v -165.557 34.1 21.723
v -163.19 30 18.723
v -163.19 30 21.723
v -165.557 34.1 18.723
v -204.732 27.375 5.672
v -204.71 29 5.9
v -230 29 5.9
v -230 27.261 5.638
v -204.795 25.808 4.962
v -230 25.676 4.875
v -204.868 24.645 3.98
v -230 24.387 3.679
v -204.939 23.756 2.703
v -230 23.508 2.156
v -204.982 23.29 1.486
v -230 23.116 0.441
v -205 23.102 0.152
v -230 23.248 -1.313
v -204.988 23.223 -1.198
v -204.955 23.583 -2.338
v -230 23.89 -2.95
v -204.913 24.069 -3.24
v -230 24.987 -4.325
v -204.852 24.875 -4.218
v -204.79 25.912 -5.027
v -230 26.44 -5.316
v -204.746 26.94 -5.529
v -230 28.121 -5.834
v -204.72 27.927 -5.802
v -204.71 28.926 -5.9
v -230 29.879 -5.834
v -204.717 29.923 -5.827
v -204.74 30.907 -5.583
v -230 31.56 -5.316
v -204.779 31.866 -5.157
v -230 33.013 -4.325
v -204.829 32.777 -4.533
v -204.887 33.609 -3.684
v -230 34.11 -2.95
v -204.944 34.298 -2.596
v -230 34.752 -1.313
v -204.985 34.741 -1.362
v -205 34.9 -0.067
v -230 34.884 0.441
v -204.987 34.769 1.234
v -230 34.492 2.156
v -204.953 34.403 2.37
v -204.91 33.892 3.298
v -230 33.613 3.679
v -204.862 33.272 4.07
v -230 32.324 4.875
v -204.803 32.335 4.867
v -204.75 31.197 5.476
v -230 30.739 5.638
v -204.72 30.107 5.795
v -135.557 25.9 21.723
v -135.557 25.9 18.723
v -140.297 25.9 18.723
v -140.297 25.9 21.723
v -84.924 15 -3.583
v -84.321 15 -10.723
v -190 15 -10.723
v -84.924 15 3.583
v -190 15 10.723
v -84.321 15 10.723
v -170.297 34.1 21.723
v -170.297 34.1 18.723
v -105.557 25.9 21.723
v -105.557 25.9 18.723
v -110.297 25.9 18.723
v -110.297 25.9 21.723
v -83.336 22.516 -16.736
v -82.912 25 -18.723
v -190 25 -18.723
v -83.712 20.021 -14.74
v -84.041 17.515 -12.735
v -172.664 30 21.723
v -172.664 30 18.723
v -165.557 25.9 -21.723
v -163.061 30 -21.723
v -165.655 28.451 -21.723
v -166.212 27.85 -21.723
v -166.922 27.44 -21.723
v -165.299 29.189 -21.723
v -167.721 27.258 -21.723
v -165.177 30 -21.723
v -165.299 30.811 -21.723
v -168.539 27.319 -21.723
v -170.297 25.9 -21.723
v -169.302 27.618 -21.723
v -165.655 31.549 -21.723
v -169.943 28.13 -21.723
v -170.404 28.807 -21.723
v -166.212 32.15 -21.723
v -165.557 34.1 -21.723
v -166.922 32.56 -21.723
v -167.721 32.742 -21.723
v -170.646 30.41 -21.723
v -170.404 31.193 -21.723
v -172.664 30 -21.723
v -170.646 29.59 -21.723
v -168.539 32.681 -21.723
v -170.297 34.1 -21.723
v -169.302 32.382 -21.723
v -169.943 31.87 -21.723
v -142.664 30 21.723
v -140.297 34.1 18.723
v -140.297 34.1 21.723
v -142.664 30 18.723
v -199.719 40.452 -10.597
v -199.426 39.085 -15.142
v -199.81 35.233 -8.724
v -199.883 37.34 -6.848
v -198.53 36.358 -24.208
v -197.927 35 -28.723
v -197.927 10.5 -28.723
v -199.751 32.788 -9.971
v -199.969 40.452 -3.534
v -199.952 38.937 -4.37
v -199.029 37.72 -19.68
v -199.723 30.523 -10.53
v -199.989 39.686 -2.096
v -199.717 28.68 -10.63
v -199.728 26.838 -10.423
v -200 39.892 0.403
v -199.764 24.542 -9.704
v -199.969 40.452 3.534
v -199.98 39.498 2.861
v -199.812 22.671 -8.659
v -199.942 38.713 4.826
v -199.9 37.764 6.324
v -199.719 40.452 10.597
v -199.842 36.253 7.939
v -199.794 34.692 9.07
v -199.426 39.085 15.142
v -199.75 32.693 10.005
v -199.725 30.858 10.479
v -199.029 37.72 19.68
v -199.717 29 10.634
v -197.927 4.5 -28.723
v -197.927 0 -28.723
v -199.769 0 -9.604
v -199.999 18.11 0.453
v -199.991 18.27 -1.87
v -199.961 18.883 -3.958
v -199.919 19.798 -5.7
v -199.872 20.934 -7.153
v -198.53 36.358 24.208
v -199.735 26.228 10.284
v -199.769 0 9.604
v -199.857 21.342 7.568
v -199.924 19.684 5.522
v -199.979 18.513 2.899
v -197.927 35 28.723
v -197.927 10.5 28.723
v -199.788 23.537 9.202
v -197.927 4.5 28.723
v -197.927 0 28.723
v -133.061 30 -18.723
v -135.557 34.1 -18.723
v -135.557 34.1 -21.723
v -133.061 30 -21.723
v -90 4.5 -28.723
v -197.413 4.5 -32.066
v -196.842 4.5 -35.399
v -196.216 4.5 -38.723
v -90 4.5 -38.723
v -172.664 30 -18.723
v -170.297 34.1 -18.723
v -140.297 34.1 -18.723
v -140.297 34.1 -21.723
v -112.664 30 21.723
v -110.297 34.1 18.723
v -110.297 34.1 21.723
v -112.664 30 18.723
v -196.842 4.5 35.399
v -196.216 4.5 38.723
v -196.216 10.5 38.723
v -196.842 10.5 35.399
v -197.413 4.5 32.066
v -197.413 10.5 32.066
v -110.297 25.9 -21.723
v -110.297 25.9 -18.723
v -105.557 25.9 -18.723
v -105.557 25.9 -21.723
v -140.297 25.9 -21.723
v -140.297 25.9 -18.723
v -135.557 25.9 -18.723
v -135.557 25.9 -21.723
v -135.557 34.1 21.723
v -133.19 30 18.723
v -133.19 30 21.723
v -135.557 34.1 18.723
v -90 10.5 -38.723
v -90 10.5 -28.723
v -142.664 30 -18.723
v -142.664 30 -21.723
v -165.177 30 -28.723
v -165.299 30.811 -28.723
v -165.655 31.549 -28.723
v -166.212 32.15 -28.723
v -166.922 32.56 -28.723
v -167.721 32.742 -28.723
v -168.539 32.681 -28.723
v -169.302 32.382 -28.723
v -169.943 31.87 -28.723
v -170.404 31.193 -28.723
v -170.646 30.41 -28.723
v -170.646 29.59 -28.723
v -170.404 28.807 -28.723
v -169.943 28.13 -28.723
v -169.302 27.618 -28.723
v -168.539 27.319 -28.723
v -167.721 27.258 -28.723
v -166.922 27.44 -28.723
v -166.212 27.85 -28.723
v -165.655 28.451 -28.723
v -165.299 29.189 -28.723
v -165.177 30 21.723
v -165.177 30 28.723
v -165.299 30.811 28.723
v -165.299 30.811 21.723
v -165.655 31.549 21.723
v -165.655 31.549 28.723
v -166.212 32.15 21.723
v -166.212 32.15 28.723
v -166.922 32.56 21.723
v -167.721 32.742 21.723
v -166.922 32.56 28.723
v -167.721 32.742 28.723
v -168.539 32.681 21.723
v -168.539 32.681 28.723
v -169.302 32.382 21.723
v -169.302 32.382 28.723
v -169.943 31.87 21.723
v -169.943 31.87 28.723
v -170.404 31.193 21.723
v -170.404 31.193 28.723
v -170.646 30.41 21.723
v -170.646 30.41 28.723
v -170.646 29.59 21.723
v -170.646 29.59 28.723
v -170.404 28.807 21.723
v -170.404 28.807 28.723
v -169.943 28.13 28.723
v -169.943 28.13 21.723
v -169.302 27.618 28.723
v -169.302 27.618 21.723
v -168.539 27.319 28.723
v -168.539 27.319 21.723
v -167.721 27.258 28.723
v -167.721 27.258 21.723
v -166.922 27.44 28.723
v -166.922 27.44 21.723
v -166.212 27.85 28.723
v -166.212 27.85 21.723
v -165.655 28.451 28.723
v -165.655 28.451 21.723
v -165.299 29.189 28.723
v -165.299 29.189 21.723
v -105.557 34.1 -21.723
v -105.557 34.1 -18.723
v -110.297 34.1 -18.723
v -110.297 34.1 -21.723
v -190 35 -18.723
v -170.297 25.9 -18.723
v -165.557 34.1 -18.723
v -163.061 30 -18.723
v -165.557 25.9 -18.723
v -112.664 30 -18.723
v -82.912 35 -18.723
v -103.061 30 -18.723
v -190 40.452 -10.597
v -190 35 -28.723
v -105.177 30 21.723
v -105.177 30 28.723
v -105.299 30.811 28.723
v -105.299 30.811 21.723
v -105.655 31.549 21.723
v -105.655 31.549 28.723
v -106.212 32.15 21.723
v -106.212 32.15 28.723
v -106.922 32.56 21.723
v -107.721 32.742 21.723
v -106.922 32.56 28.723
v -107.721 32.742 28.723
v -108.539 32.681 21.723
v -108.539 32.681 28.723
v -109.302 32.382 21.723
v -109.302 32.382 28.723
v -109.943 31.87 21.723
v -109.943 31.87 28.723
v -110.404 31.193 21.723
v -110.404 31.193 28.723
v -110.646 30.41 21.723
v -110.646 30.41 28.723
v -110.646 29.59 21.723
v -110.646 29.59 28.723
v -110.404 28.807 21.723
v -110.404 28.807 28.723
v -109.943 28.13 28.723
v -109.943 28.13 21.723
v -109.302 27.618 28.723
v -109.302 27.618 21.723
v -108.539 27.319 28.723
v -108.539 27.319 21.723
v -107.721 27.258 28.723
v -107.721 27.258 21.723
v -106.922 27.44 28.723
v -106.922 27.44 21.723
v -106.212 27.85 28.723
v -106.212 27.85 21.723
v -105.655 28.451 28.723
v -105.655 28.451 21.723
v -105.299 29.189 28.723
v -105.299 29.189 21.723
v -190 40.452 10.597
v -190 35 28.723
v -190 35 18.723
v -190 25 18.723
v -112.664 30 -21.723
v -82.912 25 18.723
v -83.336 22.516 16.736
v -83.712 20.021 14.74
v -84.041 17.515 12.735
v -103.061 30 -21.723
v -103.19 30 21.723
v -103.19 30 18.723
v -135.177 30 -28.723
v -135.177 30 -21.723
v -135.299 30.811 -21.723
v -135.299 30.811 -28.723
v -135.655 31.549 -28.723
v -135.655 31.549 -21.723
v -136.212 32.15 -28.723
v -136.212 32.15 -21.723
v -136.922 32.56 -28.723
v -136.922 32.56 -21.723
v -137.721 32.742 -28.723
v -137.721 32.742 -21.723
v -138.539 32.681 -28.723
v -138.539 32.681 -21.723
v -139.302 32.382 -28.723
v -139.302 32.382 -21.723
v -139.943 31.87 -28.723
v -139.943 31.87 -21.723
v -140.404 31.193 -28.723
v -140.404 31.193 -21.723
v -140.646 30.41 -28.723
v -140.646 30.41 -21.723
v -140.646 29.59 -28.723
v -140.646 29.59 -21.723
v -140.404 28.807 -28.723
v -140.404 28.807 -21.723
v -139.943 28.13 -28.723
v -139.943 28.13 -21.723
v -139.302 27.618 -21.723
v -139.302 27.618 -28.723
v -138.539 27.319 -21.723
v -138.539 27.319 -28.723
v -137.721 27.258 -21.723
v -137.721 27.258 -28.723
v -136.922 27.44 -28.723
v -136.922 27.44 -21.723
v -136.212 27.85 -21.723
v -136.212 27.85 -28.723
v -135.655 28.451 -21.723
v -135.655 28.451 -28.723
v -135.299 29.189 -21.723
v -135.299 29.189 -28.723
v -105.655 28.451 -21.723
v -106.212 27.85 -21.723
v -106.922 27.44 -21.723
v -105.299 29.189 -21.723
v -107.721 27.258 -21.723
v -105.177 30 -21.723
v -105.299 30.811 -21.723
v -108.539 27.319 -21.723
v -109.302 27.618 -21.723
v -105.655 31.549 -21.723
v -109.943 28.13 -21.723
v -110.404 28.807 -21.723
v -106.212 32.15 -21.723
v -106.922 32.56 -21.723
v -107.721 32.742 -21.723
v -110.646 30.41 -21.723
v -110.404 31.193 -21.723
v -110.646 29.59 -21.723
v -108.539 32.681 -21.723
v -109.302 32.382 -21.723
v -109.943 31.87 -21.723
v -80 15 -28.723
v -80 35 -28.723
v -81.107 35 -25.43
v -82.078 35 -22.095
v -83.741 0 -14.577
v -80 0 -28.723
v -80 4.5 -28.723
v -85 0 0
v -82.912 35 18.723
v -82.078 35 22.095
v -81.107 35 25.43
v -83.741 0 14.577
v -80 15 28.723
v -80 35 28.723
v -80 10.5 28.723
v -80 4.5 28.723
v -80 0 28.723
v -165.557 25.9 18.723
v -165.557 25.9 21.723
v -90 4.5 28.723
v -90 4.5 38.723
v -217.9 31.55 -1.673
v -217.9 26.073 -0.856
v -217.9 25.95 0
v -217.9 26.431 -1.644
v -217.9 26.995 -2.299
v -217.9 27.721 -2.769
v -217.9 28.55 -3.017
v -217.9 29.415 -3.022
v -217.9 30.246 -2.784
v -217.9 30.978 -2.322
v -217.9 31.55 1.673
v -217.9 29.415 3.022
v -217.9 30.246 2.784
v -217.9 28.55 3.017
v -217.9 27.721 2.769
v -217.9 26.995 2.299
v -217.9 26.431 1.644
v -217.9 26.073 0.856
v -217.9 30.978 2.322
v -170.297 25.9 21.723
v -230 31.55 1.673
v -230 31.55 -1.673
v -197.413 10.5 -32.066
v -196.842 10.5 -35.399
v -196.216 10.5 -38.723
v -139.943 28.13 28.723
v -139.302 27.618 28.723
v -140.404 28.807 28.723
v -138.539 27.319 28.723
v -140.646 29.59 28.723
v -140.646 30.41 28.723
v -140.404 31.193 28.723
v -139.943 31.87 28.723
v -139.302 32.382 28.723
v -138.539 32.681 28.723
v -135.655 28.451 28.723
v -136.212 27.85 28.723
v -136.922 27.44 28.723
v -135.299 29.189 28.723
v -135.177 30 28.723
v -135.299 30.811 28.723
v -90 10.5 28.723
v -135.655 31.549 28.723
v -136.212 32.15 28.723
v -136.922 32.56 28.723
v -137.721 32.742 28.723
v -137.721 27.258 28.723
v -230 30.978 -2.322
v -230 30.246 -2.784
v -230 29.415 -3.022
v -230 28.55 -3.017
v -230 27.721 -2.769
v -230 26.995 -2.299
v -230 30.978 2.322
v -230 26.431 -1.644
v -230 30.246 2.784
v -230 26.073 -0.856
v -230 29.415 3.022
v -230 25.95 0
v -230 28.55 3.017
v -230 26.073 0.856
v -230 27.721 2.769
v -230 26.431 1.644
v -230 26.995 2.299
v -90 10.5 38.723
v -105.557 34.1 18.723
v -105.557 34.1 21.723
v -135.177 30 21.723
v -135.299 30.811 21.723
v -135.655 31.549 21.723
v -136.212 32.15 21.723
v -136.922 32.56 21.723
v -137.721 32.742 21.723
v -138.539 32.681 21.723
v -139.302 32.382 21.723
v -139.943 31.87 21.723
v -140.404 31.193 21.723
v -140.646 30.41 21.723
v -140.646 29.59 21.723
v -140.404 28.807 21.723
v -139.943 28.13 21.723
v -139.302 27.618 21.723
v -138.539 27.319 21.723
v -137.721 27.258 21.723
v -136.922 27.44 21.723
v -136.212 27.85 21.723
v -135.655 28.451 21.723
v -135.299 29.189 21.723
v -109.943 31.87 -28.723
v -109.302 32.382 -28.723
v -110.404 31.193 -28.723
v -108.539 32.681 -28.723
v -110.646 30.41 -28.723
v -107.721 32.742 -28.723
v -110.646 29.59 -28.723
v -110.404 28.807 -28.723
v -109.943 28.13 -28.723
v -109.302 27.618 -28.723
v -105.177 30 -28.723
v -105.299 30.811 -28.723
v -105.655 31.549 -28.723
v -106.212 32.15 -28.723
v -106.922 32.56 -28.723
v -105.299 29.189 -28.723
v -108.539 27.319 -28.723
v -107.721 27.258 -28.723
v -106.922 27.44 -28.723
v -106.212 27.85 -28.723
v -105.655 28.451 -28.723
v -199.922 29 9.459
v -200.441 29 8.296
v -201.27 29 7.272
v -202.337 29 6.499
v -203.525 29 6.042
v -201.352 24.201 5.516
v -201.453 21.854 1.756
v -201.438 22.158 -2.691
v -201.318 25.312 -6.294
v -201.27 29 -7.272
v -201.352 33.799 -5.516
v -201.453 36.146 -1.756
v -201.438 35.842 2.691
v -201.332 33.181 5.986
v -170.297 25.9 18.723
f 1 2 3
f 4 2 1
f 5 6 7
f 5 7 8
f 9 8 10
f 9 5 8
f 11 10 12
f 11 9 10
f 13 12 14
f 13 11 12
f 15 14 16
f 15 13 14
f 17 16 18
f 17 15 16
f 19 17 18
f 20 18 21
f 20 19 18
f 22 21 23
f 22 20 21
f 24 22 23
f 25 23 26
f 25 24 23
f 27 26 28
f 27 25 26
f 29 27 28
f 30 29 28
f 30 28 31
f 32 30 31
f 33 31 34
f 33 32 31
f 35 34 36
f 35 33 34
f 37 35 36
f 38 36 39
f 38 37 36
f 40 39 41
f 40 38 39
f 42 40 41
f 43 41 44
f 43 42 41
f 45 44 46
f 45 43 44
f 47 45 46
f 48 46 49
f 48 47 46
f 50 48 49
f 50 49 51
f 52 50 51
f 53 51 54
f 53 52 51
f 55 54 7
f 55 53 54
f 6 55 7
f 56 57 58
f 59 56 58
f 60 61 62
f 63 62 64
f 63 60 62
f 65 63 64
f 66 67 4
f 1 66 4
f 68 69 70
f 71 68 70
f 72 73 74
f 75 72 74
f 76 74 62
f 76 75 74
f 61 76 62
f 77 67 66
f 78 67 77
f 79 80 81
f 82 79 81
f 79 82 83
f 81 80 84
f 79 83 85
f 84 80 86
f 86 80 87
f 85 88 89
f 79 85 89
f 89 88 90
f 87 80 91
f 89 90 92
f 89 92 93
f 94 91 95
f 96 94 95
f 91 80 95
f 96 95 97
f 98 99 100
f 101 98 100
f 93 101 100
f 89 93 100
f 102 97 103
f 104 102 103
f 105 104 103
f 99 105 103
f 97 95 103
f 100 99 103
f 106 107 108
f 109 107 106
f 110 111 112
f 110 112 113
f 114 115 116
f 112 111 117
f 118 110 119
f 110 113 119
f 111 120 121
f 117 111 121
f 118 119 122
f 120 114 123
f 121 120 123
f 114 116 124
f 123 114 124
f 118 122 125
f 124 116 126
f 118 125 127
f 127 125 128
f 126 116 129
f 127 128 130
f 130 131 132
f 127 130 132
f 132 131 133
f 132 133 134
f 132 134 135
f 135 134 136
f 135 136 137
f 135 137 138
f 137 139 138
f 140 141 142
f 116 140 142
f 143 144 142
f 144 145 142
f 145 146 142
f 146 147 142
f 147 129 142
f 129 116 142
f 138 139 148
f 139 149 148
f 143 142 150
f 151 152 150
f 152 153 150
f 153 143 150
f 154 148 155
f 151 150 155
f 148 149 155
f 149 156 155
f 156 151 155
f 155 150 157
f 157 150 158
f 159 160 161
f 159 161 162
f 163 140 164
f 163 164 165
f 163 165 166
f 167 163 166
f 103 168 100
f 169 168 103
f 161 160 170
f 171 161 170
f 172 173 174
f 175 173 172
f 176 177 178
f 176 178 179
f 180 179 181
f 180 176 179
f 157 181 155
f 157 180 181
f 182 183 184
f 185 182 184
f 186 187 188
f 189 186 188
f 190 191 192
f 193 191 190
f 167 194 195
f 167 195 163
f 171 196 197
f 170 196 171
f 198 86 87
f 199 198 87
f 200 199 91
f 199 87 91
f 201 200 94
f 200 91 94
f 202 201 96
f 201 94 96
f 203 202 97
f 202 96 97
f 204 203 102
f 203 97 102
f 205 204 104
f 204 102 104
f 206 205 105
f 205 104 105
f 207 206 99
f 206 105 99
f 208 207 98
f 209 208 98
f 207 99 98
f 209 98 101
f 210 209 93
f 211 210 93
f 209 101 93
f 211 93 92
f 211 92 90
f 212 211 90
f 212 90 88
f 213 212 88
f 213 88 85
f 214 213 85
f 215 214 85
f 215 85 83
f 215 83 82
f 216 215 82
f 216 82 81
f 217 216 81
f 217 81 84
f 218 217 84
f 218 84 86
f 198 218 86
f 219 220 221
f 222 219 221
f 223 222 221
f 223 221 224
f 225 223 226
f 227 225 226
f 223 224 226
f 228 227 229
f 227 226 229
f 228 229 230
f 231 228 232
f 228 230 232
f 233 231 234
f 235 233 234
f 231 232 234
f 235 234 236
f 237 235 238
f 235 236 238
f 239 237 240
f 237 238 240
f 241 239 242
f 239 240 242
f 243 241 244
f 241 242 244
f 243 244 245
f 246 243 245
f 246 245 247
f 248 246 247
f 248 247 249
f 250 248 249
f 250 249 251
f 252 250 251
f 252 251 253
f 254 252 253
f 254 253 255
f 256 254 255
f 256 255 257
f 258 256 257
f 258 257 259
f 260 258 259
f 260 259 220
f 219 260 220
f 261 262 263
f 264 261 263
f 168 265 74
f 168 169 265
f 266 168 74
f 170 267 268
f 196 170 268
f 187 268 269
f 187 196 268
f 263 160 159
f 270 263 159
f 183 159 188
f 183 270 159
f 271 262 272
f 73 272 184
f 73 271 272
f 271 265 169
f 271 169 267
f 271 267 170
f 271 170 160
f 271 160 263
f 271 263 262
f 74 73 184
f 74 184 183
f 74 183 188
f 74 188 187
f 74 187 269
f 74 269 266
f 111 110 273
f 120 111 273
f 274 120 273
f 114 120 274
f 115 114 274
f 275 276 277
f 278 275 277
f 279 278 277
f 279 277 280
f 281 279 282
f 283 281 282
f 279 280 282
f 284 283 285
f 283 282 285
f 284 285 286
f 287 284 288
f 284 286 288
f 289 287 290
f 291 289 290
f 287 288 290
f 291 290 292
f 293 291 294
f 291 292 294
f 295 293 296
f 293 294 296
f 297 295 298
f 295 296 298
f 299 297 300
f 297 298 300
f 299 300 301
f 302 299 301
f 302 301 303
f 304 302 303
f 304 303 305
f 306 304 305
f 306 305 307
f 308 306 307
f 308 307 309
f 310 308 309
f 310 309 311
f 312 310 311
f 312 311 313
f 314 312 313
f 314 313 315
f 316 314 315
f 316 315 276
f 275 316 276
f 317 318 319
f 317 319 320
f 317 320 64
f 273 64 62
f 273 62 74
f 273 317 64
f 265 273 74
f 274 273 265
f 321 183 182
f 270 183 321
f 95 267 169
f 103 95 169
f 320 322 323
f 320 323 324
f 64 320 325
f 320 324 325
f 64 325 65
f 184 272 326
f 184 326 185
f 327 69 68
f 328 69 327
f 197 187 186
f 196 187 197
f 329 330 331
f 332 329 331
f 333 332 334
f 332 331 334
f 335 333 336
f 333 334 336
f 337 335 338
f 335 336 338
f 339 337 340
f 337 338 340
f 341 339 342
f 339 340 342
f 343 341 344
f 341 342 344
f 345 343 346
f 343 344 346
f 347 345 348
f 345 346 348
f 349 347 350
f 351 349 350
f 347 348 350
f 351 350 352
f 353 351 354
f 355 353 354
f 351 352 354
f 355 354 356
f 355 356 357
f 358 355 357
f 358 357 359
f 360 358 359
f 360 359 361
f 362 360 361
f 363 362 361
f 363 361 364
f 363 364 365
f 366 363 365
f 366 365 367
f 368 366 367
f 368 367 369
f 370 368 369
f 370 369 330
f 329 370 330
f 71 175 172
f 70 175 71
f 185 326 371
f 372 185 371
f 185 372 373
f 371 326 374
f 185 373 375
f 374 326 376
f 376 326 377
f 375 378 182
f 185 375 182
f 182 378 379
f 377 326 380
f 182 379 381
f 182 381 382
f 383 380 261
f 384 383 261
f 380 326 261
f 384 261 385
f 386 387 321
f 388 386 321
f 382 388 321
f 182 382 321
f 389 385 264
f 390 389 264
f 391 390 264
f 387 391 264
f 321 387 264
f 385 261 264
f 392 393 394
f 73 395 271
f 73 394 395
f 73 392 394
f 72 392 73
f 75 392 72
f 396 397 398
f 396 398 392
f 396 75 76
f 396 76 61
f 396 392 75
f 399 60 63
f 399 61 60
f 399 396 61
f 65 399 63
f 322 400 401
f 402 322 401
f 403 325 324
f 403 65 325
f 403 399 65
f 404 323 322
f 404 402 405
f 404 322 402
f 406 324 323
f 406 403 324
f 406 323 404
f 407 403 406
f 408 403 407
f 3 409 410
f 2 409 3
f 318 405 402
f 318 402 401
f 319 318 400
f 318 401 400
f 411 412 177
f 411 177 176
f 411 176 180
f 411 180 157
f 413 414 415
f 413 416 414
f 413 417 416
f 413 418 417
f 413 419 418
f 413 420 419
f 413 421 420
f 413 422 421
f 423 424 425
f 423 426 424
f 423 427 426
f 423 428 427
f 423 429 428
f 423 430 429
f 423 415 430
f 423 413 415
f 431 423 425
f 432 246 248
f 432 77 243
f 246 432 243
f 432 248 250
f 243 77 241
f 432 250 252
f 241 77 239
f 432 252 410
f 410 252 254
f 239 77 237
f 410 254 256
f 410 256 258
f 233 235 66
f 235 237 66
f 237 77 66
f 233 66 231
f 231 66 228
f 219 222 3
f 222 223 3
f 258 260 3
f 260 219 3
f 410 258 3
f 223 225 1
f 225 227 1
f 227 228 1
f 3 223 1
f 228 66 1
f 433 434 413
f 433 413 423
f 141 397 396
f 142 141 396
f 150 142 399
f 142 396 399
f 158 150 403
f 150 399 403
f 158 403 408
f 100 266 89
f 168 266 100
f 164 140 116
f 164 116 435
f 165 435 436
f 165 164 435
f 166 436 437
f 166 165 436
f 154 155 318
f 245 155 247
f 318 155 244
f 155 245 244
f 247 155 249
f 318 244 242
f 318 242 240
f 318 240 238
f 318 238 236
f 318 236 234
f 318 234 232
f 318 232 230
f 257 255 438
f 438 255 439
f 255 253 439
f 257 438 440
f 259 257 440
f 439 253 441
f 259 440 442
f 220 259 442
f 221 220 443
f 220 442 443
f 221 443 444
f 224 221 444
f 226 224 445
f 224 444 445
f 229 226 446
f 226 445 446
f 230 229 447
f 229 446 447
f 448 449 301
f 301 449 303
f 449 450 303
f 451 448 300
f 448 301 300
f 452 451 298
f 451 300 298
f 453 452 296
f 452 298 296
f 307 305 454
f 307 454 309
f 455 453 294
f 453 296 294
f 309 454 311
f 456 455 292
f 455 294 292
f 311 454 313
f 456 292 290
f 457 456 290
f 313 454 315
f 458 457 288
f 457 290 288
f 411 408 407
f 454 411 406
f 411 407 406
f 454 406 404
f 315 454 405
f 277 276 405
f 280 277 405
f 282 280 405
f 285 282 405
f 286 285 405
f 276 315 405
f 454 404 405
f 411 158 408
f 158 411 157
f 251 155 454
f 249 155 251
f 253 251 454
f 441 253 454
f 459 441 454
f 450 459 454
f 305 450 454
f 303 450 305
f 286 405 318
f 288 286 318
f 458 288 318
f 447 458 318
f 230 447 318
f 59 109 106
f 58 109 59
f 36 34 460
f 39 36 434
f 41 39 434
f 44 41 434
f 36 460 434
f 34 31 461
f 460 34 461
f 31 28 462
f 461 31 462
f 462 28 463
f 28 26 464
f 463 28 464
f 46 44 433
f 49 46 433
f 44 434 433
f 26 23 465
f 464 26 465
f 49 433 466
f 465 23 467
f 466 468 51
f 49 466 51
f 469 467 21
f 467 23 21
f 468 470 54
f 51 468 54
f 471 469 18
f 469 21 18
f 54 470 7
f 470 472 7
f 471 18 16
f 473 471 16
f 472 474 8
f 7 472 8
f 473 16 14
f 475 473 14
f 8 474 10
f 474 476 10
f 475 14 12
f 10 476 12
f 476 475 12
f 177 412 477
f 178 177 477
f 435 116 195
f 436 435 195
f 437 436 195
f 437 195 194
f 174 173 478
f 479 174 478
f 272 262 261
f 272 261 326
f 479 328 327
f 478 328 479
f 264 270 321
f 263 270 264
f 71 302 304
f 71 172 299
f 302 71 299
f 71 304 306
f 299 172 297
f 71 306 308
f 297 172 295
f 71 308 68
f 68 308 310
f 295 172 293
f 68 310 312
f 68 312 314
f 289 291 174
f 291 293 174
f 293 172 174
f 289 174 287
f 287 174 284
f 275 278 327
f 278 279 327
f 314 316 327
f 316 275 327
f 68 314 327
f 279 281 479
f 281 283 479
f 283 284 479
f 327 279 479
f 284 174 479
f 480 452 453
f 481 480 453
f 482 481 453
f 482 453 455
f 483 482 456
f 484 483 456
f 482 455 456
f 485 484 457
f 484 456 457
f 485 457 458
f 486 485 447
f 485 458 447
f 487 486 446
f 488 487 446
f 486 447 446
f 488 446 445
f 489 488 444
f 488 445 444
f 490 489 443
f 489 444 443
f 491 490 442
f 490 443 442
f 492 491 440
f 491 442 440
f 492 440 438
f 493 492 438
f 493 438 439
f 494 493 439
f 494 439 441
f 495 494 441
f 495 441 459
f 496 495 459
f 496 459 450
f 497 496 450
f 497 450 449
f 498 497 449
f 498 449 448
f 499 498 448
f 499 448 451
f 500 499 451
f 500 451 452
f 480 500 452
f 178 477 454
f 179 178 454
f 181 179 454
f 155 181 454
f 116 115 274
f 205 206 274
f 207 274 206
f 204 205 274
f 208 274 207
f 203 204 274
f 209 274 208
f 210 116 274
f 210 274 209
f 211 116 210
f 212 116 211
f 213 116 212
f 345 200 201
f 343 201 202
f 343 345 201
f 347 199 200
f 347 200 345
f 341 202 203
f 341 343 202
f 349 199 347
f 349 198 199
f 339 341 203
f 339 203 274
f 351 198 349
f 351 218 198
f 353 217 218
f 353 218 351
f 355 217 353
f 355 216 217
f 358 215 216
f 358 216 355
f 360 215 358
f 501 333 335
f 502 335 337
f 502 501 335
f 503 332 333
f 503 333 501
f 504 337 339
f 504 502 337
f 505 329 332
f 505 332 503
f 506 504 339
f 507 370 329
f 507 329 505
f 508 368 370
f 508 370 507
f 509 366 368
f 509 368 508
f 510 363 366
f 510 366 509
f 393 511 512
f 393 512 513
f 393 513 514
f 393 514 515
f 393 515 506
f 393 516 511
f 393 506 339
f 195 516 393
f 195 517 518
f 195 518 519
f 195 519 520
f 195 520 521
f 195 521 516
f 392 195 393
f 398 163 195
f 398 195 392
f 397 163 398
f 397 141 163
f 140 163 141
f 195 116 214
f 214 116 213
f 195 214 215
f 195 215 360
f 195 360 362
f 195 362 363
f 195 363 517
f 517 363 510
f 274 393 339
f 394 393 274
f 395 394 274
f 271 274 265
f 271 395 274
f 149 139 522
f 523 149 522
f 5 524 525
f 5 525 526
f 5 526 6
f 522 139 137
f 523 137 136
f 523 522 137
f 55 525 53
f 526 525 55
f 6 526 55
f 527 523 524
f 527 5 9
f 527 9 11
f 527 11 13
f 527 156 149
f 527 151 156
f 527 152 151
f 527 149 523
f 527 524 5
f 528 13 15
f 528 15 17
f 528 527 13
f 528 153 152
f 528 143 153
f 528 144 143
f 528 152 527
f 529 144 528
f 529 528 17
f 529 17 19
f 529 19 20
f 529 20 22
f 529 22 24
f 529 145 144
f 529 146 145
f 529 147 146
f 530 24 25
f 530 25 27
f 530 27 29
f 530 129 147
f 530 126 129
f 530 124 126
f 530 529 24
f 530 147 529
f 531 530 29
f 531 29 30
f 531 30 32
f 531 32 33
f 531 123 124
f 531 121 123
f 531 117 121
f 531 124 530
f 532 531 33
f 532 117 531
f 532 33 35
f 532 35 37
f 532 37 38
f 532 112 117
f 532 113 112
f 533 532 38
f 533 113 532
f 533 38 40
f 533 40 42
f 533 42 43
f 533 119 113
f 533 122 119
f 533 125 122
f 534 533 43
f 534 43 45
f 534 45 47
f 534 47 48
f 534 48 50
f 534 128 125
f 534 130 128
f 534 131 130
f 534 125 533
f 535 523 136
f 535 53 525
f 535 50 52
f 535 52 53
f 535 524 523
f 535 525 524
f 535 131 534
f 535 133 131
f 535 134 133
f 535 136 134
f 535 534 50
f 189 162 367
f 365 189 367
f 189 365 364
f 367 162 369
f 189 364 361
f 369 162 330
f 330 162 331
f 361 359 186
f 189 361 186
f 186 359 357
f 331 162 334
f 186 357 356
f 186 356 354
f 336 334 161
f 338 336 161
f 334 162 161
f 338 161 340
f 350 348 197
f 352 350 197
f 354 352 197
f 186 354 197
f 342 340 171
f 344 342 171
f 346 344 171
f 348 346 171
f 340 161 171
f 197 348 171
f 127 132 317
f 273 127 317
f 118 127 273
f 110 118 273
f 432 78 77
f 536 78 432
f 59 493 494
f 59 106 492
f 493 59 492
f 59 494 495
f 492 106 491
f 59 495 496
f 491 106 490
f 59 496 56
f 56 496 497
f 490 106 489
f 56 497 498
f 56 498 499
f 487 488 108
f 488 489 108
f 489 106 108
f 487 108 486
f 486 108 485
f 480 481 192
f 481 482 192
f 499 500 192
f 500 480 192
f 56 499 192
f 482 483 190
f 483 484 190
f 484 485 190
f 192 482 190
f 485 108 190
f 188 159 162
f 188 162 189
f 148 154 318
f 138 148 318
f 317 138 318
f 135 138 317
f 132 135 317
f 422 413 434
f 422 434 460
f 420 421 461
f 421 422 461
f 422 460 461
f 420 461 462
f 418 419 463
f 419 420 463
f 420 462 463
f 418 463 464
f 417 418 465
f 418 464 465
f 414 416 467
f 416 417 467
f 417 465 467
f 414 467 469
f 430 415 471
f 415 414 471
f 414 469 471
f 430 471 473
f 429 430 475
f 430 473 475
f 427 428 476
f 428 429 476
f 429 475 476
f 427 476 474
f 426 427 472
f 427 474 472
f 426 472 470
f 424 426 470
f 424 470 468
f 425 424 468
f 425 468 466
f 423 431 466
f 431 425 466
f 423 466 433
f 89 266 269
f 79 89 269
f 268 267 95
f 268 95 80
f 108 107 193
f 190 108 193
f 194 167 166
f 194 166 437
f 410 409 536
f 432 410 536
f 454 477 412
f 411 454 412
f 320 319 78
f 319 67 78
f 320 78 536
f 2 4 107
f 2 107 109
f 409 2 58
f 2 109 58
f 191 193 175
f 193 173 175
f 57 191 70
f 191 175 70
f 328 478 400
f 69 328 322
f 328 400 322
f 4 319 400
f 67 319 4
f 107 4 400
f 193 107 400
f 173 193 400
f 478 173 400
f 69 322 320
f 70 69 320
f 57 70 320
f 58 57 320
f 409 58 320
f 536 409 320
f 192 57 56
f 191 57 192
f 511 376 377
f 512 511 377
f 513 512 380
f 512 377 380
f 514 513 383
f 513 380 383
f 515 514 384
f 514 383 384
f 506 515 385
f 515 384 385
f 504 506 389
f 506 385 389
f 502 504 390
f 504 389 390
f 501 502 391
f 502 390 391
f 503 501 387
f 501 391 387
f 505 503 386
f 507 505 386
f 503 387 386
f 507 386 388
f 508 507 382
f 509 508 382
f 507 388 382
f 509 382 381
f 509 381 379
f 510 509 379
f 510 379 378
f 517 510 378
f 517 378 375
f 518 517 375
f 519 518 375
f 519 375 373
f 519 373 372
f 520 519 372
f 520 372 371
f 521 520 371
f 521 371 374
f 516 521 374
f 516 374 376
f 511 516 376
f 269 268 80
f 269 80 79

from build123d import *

# Parameters (mm, degrees)
SKETCH1_R                = 200
BOSS_EXTRUDE1_DEPTH      = 15
BOSS_EXTRUDE2_DEPTH      = 200
CUT_EXTRUDE1_DEPTH       = 286.087705803
CUT_EXTRUDE1_DEPTH_BACK  = 286.087705803
SKETCH3_R                = 85
CUT_EXTRUDE2_DEPTH       = 451.079120005
CUT_EXTRUDE2_DEPTH_BACK  = 451.079120005
SKETCH4_R                = 11
CUT_EXTRUDE3_DEPTH       = 451.079120105
CUT_EXTRUDE3_DEPTH_BACK  = 110
CUT_EXTRUDE4_DEPTH       = 110
BOSS_EXTRUDE3_DEPTH      = 200
CUT_EXTRUDE5_DEPTH       = 286.087705815
CUT_EXTRUDE5_DEPTH_BACK  = 286.087705815
SKETCH7_OUTSIDE_W        = 515.59
SKETCH7_OUTSIDE_H        = 515.59
SKETCH7_OUTSIDE_R        = 200
SKETCH9_R                = 5.9
BOSS_EXTRUDE4_DEPTH      = 230
CUT_EXTRUDE6_DEPTH       = 190
CUT_EXTRUDE8_DEPTH       = 307.879455313
CUT_EXTRUDE8_DEPTH_BACK  = 307.879455313
SKETCH12_OUTSIDE_W       = 584.34
SKETCH12_OUTSIDE_H       = 524.34
SKETCH12_OUTSIDE_W_2     = 160.728506479
SKETCH12_OUTSIDE_H_2     = 57.445626466
BOSS_EXTRUDE5_DEPTH      = 190
CUT_EXTRUDE10_DEPTH      = 198.357534097
CUT_EXTRUDE10_DEPTH_BACK = 198.357534097
SKETCH20_W               = 10
SKETCH20_H               = 6
BOSS_EXTRUDE6_DEPTH      = 200
CUT_EXTRUDE9_DEPTH       = 237.718926518
CUT_EXTRUDE9_DEPTH_BACK  = 237.718926518
SKETCH15_R               = 85
CUT_EXTRUDE11_START      = 4.5
CUT_EXTRUDE11_DEPTH      = 6
CUT_EXTRUDE12_DEPTH      = 10
CUT_EXTRUDE13_DEPTH      = 10
SKETCH25_R               = 2.75
CUT_EXTRUDE14_DEPTH      = 100
SKETCH26_R               = 3.05
CUT_EXTRUDE15_DEPTH      = 12.1
FILLET1_R                = 5
CUT_EXTRUDE16_DEPTH      = 3
LPATTERN1_COUNT          = 3
LPATTERN1_PITCH          = 30
CUT_EXTRUDE17_DEPTH      = 3
LPATTERN2_COUNT          = 3
LPATTERN2_PITCH          = 30
BOSS_EXTRUDE7_START      = 12.1
BOSS_EXTRUDE7_DEPTH      = 12.1


# Read off the part's stored shape, not the designer's step: Cut-Extrude11
with BuildPart() as part:
    # Sketch1 → Boss-Extrude1 (new body)
    with BuildSketch(Plane(origin=(0, 0, 0), x_dir=(1, 0, 0), z_dir=(0, 1, 0))):
        with Locations(Location((0, 0, 0), (0, 0, 270))):
            Circle(SKETCH1_R)
    extrude(amount=BOSS_EXTRUDE1_DEPTH)

    # Sketch2 → Boss-Extrude2 (add, symmetric)
    with BuildSketch(Plane.XY):
        Polygon((-25, 50.707142143), (25, 50.707142143), (60, 15), (-60, 15), align=None)
    extrude(amount=BOSS_EXTRUDE2_DEPTH, both=True)

    # Sketch3 → Cut-Extrude1 (cut, two sides: drawn at the far end of the back side and taken through both)
    with BuildSketch(Plane(origin=(0, 15, 0), x_dir=(1, 0, 0), z_dir=(0, 1, 0)).offset(-CUT_EXTRUDE1_DEPTH_BACK)):
        with Locations(Location((0, 0, 0), (0, 0, 270))):
            Circle(SKETCH3_R)
    extrude(amount=CUT_EXTRUDE1_DEPTH + CUT_EXTRUDE1_DEPTH_BACK, mode=Mode.SUBTRACT)

    # Sketch4 → Cut-Extrude2 (cut, two sides: drawn at the far end of the back side and taken through both)
    with BuildSketch(Plane(origin=(0, 0, -200), x_dir=(-1, 0, 0), z_dir=(0, 0, -1)).offset(-CUT_EXTRUDE2_DEPTH_BACK)):
        with Locations((0, 29)):
            Circle(SKETCH4_R)
    extrude(amount=CUT_EXTRUDE2_DEPTH + CUT_EXTRUDE2_DEPTH_BACK, mode=Mode.SUBTRACT)

    # Sketch5 → Cut-Extrude3 (cut, two sides: drawn at the far end of the back side and taken through both)
    with BuildSketch(Plane.XY.offset(200).offset(-CUT_EXTRUDE3_DEPTH_BACK)):
        Polygon((-25, 50.707142143), (25, 50.707142143), (50.198039412, 25), (25, 25), (25, 15), (-25, 15), (-25, 25), (-50.198039412, 25), align=None)
    extrude(amount=CUT_EXTRUDE3_DEPTH + CUT_EXTRUDE3_DEPTH_BACK, mode=Mode.SUBTRACT)

    # Sketch6 → Cut-Extrude4 (cut)
    with BuildSketch(Plane(origin=(0, 0, -200), x_dir=(-1, 0, 0), z_dir=(0, 0, -1))):
        Polygon((-25, 50.707142143), (25, 50.707142143), (50.198039412, 25), (25, 25), (25, 15), (-25, 15), (-25, 25), (-50.198039412, 25), align=None)
    extrude(amount=-CUT_EXTRUDE4_DEPTH, mode=Mode.SUBTRACT)

    # Sketch8 → Boss-Extrude3 (add, symmetric)
    with BuildSketch(Plane(origin=(0, 0, 0), x_dir=(0, 0, -1), z_dir=(1, 0, 0))):
        Polygon((0, 15), (-30, 15), (-29.95, 44.999958333), (29.95, 44.999958333), (30, 15), align=None)
    extrude(amount=BOSS_EXTRUDE3_DEPTH, both=True)

    # Sketch7 outside → Cut-Extrude5 (cut, two sides: drawn at the far end of the back side and taken through both)
    with BuildSketch(Plane(origin=(0, 15, 0), x_dir=(1, 0, 0), z_dir=(0, 1, 0)).offset(-CUT_EXTRUDE5_DEPTH_BACK)):
        Rectangle(SKETCH7_OUTSIDE_W, SKETCH7_OUTSIDE_H)
        with Locations(Location((0, 0, 0), (0, 0, 97.180755781))):
            Circle(SKETCH7_OUTSIDE_R, mode=Mode.SUBTRACT)
    extrude(amount=CUT_EXTRUDE5_DEPTH + CUT_EXTRUDE5_DEPTH_BACK, mode=Mode.SUBTRACT)

    # Sketch9 → Boss-Extrude4 (add, symmetric)
    with BuildSketch(Plane(origin=(0, 0, 0), x_dir=(0, 0, -1), z_dir=(1, 0, 0))):
        with Locations(Location((0, 29, 0), (0, 0, 180))):
            Circle(SKETCH9_R)
    extrude(amount=BOSS_EXTRUDE4_DEPTH, both=True)

    # Sketch10 → Cut-Extrude6 (cut, symmetric)
    with BuildSketch(Plane(origin=(0, 0, 0), x_dir=(0, 0, -1), z_dir=(1, 0, 0))):
        Polygon((-30, 15), (30, 15), (29.95, 44.999958333), (-29.95, 44.999958333), align=None)
    extrude(amount=CUT_EXTRUDE6_DEPTH, both=True, mode=Mode.SUBTRACT)

    # Sketch12 outside → Cut-Extrude8 (cut, two sides: drawn at the far end of the back side and taken through both)
    with BuildSketch(Plane(origin=(0, 15, 0), x_dir=(1, 0, 0), z_dir=(0, 1, 0)).offset(-CUT_EXTRUDE8_DEPTH_BACK)):
        Rectangle(SKETCH12_OUTSIDE_W, SKETCH12_OUTSIDE_H)
        with Locations((-160.364253239, 0)):
            Rectangle(SKETCH12_OUTSIDE_W_2, SKETCH12_OUTSIDE_H_2, mode=Mode.SUBTRACT)
    extrude(amount=CUT_EXTRUDE8_DEPTH + CUT_EXTRUDE8_DEPTH_BACK, mode=Mode.SUBTRACT)

    # Sketch14 → Boss-Extrude5 (add)
    with BuildSketch(Plane(origin=(0, 0, 0), x_dir=(0, 0, -1), z_dir=(1, 0, 0))):
        Polygon((-28.722813233, 15), (-28.722813233, 35), (-18.722813233, 35), (-18.722813233, 25), (-10.722813233, 15), align=None)
        Polygon((28.722813233, 15), (28.722813233, 35), (18.722813233, 35), (18.722813233, 25), (10.722813233, 15), align=None)
    extrude(amount=-BOSS_EXTRUDE5_DEPTH)

    # Sketch16 → Cut-Extrude10 (cut, two sides: drawn at the far end of the back side and taken through both)
    with BuildSketch(Plane(origin=(-190, 0, 0), x_dir=(0, 0, -1), z_dir=(1, 0, 0)).offset(-CUT_EXTRUDE10_DEPTH_BACK)):
        Polygon((-28.722813233, 35), (-10.596657492, 40.452365235), (10.596657492, 40.452365235), (28.722813233, 35), (31.38249, 46.365203084), (-30.991256821, 46.365203084), align=None)
    extrude(amount=CUT_EXTRUDE10_DEPTH + CUT_EXTRUDE10_DEPTH_BACK, mode=Mode.SUBTRACT)

    # Sketch20 → Boss-Extrude6 (add)
    with BuildSketch(Plane(origin=(0, 0, 0), x_dir=(0, 0, -1), z_dir=(1, 0, 0))):
        with Locations((-33.722813233, 7.5)):
            Rectangle(SKETCH20_W, SKETCH20_H)
        with Locations((33.722813233, 7.5)):
            Rectangle(SKETCH20_W, SKETCH20_H)
    extrude(amount=-BOSS_EXTRUDE6_DEPTH)

    # Sketch15 → Cut-Extrude9 (cut, two sides: drawn at the far end of the back side and taken through both)
    with BuildSketch(Plane(origin=(0, 0, 0), x_dir=(1, 0, 0), z_dir=(0, 1, 0)).offset(-CUT_EXTRUDE9_DEPTH_BACK)):
        Circle(SKETCH15_R)
    extrude(amount=CUT_EXTRUDE9_DEPTH + CUT_EXTRUDE9_DEPTH_BACK, mode=Mode.SUBTRACT)

    # Cut-Extrude11 outline → Cut-Extrude11 (cut)
    with BuildSketch(Plane(origin=(0, 0, 0), x_dir=(1, 0, 0), z_dir=(0, 1, 0)).offset(CUT_EXTRUDE11_START)):
        with BuildLine():
            ThreePointArc((-196.215554265, -38.722813233), (-197.13457286, -33.733665434), (-197.926754129, -28.722813233))
            Line((-197.926754129, -28.722813233), (-200, -28.722813233))
            Line((-200, -28.722813233), (-200, -38.722813233))
            Line((-200, -38.722813233), (-196.215554265, -38.722813233))
        make_face()
        with BuildLine():
            Line((-200, 28.722813233), (-197.926754129, 28.722813233))
            ThreePointArc((-197.926754129, 28.722813233), (-197.13457286, 33.733665434), (-196.215554265, 38.722813233))
            Line((-196.215554265, 38.722813233), (-200, 38.722813233))
            Line((-200, 38.722813233), (-200, 28.722813233))
        make_face()
    extrude(amount=CUT_EXTRUDE11_DEPTH, mode=Mode.SUBTRACT)

    # Sketch23 → Cut-Extrude12 (cut)
    with BuildSketch(Plane(origin=(0, 0, -38.722813233), x_dir=(-1, 0, 0), z_dir=(0, 0, -1))):
        Polygon((75.667322771, 10.5), (80, 10.5), (90, 10.5), (90, 4.5), (75.667322771, 4.5), align=None)
    extrude(amount=-CUT_EXTRUDE12_DEPTH, mode=Mode.SUBTRACT)

    # Sketch24 → Cut-Extrude13 (cut)
    with BuildSketch(Plane.XY.offset(38.722813233)):
        Polygon((-75.667322771, 10.5), (-80, 10.5), (-90, 10.5), (-90, 4.5), (-75.667322771, 4.5), align=None)
    extrude(amount=-CUT_EXTRUDE13_DEPTH, mode=Mode.SUBTRACT)

    # Sketch25 → Cut-Extrude14 (cut)
    with BuildSketch(Plane.XY.offset(28.722813233)):
        with Locations((-167.926754129, 30)):
            Circle(SKETCH25_R)
        with Locations((-107.926754129, 30)):
            Circle(SKETCH25_R)
        with Locations((-137.926754129, 30)):
            Circle(SKETCH25_R)
    extrude(amount=-CUT_EXTRUDE14_DEPTH, mode=Mode.SUBTRACT)

    # Sketch26 → Cut-Extrude15 (cut)
    with BuildSketch(Plane.ZY.offset(230)):
        with Locations((0, 29)):
            Circle(SKETCH26_R)
    extrude(amount=-CUT_EXTRUDE15_DEPTH, mode=Mode.SUBTRACT)

    # Fillet1
    fillet1_edges = [part.edges().sort_by_distance(p)[0] for p in [
        (-199.912956058, 29, -5.9),
    ]]
    fillet(fillet1_edges, radius=FILLET1_R)

    # Sketch27 → Cut-Extrude16 (cut)
    with BuildSketch(Plane.XY.offset(-18.722813233)):
        Polygon((-167.926754129, 34.1), (-165.556754129, 34.1), (-163.060757334, 30), (-165.556754129, 25.9), (-167.926754129, 25.9), (-170.296754129, 25.9), (-172.663890233, 30), (-170.296754129, 34.1), align=None)
    cut_extrude16 = extrude(amount=-CUT_EXTRUDE16_DEPTH, mode=Mode.SUBTRACT)

    # LPattern1: Cut-Extrude16 ×3
    with Locations(*[(i * LPATTERN1_PITCH, 0, 0) for i in range(1, LPATTERN1_COUNT)]):
        add(cut_extrude16, mode=Mode.SUBTRACT)

    # Sketch28 → Cut-Extrude17 (cut)
    with BuildSketch(Plane(origin=(0, 0, 18.722813233), x_dir=(-1, 0, 0), z_dir=(0, 0, -1))):
        Polygon((107.926754129, 34.1), (110.296754129, 34.1), (112.663890233, 30), (110.296754129, 25.9), (107.926754129, 25.9), (105.556754129, 25.9), (103.189618025, 30), (105.556754129, 34.1), align=None)
    cut_extrude17 = extrude(amount=-CUT_EXTRUDE17_DEPTH, mode=Mode.SUBTRACT)

    # LPattern2: Cut-Extrude17 ×3
    with Locations(*[(-i * LPATTERN2_PITCH, 0, 0) for i in range(1, LPATTERN2_COUNT)]):
        add(cut_extrude17, mode=Mode.SUBTRACT)

    # Sketch29 → Boss-Extrude7 (add)
    with BuildSketch(Plane.ZY.offset(217.9).offset(BOSS_EXTRUDE7_START)):
        with BuildLine():
            Line((-1.673320053, 31.55), (1.673320053, 31.55))
            ThreePointArc((1.673320053, 31.55), (0, 32.05), (-1.673320053, 31.55))
        make_face()
    extrude(amount=-BOSS_EXTRUDE7_DEPTH)


solid = part.part
